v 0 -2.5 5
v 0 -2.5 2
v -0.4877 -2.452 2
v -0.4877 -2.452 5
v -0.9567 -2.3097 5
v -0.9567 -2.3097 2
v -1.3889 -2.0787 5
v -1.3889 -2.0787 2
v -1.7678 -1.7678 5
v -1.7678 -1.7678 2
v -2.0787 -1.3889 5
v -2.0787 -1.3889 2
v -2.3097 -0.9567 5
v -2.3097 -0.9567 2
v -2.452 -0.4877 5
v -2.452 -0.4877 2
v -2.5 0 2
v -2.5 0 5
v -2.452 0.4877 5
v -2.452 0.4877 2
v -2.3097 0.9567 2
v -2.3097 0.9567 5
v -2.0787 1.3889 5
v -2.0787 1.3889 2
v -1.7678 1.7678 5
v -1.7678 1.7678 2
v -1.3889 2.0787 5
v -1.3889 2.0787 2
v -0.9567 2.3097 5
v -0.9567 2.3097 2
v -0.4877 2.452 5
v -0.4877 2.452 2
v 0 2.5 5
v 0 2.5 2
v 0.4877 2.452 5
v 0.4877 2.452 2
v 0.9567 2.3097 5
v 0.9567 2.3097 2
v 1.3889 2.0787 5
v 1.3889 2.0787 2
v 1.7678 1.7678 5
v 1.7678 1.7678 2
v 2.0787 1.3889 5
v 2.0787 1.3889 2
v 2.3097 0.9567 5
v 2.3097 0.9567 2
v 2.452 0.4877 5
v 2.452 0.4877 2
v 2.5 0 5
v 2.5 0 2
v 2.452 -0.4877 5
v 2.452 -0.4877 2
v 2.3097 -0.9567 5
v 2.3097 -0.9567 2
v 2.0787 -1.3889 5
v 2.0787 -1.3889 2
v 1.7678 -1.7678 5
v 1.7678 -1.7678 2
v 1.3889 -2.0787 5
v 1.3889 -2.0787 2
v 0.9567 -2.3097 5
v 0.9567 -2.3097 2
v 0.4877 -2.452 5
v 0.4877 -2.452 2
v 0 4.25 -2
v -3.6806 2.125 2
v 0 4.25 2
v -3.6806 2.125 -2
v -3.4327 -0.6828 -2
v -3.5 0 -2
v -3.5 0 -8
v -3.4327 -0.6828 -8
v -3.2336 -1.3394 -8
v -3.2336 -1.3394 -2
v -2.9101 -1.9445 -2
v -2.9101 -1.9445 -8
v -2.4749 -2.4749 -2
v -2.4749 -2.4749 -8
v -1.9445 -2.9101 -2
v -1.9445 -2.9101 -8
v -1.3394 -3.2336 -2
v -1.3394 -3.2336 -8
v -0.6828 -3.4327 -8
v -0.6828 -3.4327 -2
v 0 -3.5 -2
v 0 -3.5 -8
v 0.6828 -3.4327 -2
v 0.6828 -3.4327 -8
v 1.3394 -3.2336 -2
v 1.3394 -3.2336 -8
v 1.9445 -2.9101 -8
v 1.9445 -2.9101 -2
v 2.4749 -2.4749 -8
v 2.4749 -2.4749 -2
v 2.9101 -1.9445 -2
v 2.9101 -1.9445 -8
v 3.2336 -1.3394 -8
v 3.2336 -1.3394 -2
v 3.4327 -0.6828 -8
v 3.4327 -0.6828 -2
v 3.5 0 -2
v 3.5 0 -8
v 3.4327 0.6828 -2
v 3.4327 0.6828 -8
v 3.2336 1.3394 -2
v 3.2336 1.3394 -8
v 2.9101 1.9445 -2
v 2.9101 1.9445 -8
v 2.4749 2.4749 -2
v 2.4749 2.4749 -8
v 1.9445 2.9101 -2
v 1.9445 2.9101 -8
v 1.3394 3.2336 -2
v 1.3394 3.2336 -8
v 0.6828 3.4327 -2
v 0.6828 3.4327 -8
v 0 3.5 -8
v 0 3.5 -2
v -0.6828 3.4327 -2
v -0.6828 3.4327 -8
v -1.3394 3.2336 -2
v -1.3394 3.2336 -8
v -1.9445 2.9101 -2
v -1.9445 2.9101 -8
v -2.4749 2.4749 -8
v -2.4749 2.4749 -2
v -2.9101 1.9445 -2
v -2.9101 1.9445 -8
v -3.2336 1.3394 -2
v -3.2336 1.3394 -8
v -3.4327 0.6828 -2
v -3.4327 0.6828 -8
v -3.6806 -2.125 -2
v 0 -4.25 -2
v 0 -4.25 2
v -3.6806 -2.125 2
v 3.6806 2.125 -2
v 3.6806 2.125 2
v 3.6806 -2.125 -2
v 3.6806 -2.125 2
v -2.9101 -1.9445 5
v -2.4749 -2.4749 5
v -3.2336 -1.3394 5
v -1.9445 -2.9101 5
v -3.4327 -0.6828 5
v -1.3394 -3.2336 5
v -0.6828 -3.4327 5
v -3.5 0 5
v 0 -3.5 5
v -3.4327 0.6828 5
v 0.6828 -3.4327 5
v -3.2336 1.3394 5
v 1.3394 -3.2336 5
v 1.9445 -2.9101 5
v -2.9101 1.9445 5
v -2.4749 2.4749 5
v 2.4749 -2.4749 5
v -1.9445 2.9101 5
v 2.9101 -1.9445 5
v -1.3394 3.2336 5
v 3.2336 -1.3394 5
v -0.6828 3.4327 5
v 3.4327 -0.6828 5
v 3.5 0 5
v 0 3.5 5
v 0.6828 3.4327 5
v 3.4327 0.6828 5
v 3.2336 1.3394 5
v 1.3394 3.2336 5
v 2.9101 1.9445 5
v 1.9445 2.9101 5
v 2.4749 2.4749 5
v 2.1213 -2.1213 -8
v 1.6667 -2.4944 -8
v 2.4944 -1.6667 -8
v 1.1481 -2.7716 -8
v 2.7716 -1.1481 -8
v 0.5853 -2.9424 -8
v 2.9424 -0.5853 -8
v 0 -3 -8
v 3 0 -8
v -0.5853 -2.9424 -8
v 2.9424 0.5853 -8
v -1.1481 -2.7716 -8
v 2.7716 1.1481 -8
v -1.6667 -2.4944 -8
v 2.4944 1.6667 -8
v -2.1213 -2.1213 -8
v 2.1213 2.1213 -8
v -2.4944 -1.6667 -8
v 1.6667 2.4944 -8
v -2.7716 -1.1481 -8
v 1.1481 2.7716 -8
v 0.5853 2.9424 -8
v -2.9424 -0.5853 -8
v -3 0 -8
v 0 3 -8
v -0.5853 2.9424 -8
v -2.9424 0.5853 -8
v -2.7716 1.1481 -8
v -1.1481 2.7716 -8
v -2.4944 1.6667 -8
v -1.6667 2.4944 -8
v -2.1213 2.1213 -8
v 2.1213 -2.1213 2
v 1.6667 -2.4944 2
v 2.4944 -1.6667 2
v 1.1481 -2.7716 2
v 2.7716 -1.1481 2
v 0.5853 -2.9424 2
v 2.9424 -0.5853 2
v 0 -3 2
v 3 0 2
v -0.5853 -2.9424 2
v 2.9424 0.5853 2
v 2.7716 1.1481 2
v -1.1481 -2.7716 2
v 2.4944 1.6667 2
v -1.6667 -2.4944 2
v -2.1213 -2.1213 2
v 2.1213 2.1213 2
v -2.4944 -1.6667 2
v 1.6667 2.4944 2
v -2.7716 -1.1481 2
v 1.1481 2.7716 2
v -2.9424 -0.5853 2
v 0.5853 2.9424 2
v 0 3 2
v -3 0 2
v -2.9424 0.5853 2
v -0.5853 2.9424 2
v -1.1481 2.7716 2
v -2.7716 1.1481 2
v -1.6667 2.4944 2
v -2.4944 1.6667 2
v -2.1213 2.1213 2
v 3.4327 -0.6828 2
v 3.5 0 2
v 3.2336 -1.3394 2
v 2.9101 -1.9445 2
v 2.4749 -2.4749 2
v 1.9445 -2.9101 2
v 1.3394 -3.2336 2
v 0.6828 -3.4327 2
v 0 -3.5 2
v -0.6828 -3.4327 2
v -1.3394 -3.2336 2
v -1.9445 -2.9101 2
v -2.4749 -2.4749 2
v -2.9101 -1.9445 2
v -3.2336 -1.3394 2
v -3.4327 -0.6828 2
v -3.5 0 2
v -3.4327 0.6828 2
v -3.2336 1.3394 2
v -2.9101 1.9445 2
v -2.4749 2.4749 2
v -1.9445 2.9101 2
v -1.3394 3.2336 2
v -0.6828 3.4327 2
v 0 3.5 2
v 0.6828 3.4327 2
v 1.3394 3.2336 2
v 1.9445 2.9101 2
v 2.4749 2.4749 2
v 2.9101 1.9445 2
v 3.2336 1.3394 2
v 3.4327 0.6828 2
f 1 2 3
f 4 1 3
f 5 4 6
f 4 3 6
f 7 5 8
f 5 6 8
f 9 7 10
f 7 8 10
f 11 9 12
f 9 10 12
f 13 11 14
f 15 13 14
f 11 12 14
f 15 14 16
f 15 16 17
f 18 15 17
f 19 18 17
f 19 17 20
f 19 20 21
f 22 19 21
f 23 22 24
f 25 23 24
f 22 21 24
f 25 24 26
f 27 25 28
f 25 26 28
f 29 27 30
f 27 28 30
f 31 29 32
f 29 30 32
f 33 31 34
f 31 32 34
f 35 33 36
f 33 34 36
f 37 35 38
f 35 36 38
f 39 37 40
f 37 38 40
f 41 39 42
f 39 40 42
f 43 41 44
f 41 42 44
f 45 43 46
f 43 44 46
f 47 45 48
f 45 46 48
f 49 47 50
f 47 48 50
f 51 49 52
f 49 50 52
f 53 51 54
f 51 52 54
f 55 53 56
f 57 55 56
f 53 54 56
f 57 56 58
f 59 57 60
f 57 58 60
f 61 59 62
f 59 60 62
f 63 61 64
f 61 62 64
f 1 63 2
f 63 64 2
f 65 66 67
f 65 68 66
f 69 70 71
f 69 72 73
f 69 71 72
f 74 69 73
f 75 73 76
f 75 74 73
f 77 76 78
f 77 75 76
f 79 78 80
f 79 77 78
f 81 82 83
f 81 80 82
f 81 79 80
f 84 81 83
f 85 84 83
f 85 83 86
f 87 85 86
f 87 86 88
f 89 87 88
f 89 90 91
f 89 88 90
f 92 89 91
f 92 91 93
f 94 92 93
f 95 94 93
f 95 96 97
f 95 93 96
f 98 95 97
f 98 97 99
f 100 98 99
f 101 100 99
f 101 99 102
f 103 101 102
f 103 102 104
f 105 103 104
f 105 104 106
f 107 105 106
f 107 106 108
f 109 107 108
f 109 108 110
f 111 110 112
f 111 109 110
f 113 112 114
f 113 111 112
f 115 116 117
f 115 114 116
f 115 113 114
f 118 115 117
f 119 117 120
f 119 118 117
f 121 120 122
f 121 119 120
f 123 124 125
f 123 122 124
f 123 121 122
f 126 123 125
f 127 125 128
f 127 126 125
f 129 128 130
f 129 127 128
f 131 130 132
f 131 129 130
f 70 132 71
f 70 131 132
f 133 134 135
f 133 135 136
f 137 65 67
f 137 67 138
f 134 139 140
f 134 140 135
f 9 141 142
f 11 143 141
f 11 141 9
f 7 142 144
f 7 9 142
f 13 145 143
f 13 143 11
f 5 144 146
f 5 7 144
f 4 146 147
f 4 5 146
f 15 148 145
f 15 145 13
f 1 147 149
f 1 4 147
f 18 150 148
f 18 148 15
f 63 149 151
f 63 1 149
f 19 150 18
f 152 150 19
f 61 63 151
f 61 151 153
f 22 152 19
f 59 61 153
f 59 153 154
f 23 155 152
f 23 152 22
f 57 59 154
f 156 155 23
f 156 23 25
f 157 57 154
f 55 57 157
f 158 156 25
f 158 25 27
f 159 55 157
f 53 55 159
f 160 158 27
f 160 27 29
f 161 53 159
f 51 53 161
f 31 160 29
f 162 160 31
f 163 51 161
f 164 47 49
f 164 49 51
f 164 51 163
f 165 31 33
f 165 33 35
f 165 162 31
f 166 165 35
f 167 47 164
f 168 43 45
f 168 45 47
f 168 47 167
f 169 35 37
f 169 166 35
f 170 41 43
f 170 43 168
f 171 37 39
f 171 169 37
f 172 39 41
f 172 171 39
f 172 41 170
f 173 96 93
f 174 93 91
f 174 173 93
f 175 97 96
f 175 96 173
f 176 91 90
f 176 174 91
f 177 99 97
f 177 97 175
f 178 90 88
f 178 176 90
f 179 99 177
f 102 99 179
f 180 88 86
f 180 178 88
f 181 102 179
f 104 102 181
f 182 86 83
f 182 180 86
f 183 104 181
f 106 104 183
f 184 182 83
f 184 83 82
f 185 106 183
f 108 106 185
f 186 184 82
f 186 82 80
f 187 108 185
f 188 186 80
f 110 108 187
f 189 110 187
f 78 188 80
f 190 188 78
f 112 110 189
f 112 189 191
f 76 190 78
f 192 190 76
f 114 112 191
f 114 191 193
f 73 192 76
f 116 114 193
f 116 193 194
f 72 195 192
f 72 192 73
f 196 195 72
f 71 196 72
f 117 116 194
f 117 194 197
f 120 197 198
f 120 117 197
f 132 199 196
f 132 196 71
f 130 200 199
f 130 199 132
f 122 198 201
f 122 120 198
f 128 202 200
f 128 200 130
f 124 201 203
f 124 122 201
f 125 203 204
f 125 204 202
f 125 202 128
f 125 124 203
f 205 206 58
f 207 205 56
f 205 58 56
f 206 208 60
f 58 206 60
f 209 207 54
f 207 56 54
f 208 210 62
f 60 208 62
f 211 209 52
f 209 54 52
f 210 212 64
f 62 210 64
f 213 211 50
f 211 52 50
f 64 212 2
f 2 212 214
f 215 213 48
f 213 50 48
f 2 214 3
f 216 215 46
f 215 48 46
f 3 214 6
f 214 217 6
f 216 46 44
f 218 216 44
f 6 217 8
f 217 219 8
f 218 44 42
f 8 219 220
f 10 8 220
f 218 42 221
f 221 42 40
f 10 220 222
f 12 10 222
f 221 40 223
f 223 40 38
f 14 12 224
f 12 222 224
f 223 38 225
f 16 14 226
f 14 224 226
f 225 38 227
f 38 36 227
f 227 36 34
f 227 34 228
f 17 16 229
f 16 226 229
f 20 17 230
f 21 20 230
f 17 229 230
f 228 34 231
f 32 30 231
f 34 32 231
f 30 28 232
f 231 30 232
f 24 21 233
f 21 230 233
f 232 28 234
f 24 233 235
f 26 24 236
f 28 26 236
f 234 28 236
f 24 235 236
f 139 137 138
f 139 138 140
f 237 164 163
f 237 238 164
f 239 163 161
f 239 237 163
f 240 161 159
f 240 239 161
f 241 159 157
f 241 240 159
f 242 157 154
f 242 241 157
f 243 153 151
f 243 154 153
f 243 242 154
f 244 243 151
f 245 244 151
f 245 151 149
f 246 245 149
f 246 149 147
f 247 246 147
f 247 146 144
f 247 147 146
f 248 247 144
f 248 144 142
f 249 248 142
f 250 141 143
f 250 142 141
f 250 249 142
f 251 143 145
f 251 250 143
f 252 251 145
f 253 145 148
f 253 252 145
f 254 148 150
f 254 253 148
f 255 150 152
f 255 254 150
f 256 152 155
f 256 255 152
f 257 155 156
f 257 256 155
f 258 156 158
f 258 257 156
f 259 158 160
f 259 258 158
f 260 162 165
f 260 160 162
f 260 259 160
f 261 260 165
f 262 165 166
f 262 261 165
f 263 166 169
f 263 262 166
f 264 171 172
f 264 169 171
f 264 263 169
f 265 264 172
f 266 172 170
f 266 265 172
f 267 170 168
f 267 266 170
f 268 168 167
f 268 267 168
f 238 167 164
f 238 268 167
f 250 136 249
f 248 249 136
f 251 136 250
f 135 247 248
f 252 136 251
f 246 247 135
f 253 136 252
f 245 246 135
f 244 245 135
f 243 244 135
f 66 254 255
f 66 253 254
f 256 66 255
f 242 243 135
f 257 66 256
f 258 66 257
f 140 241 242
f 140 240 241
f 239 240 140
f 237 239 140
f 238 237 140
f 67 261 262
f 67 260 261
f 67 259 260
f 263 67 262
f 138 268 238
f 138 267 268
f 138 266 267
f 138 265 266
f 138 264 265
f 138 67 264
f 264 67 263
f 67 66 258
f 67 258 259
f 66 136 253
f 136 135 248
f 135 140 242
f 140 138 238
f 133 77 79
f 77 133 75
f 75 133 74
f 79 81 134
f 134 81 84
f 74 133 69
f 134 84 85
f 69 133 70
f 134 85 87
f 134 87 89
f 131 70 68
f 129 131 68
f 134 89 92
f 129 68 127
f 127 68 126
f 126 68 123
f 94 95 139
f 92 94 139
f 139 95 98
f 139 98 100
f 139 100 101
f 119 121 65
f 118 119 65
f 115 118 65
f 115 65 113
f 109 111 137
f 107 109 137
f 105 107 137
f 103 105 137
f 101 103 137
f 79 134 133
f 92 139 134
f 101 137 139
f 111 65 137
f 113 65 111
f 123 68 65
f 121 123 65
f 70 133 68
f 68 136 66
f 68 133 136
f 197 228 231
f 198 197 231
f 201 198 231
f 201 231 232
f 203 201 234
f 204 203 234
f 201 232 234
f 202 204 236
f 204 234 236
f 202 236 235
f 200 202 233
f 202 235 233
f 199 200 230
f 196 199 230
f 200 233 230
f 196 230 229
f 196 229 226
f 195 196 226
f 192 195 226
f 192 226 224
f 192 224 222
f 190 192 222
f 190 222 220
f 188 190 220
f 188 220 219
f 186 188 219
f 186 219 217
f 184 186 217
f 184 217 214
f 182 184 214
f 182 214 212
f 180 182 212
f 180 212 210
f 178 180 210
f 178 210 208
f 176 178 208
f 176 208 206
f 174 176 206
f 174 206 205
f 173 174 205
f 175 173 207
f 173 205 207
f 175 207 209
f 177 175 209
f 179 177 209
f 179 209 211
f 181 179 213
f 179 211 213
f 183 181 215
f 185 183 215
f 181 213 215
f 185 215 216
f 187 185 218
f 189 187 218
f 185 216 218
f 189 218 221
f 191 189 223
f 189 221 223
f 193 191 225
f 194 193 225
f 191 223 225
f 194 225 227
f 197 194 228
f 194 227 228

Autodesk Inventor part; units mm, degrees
ref_plane "YZ Plane" through (0, 0, 0) normal (1, 0, 0) x (0, 1, 0)
ref_plane "XZ Plane" through (0, 0, 0) normal (0, 1, 0) x (-1, 0, 0)
ref_plane "XY Plane" through (0, 0, 0) normal (0, 0, 1) x (1, 0, 0)
sketch "Sketch2" plane through (0, 0, 0) normal (0, 0, 1) x (1, 0, 0)
  line L0 (0, 4.25) -> (3.6806, 2.125)
  line L1 (3.6806, 2.125) -> (3.6806, -2.125)
  line L2 (3.6806, -2.125) -> (0, -4.25)
  line L3 (0, -4.25) -> (-3.6806, -2.125)
  line L4 (-3.6806, -2.125) -> (-3.6806, 2.125)
  line L5 (-3.6806, 2.125) -> (0, 4.25)
  point P0 (0, 0)
  point P1 (0, 0)
  point P2 (-3.6806, 0)
  dimension "d0" = 8.5
extrude "Extrusion1" add sketch "Sketch2" along normal mid plane 4
sketch "Sketch3" plane through (0, 0, 2) normal (0, 0, 1) x (1, 0, 0)
  circle A0 centre (0, 0) radius 3.5
  dimension "d3" = 7
extrude "Extrusion2" add sketch "Sketch3" along normal blind 3
sketch "Sketch4" plane through (0, 0, -2) normal (0, 0, -1) x (-1, 0, 0)
  circle A0 centre (0, 0) radius 3.5
  dimension "d6" = 7
extrude "Extrusion3" add sketch "Sketch4" along normal blind 6
sketch "Sketch5" plane through (0, 0, 5) normal (0, 0, 1) x (1, 0, 0)
  circle A0 centre (0, 0) radius 3.5 projected
hole "Hole1" at (0, 0, 5) direction (0, 0, -1) diameter 5 depth 3
thread "Thread1" size "M7x1" class "6g" standard "ISO Metric profile" length 35.9
thread "Thread2" size "M7x1" class "6g" standard "ISO Metric profile" length 35.9
sketch "Sketch6" plane through (0, 0, -8) normal (0, 0, -1) x (-1, 0, 0)
  circle A0 centre (0, 0) radius 3.5 projected
hole "Hole2" at (0, 0, -8) direction (0, 0, 1) diameter 6 depth 10
properties part number "24.1"
